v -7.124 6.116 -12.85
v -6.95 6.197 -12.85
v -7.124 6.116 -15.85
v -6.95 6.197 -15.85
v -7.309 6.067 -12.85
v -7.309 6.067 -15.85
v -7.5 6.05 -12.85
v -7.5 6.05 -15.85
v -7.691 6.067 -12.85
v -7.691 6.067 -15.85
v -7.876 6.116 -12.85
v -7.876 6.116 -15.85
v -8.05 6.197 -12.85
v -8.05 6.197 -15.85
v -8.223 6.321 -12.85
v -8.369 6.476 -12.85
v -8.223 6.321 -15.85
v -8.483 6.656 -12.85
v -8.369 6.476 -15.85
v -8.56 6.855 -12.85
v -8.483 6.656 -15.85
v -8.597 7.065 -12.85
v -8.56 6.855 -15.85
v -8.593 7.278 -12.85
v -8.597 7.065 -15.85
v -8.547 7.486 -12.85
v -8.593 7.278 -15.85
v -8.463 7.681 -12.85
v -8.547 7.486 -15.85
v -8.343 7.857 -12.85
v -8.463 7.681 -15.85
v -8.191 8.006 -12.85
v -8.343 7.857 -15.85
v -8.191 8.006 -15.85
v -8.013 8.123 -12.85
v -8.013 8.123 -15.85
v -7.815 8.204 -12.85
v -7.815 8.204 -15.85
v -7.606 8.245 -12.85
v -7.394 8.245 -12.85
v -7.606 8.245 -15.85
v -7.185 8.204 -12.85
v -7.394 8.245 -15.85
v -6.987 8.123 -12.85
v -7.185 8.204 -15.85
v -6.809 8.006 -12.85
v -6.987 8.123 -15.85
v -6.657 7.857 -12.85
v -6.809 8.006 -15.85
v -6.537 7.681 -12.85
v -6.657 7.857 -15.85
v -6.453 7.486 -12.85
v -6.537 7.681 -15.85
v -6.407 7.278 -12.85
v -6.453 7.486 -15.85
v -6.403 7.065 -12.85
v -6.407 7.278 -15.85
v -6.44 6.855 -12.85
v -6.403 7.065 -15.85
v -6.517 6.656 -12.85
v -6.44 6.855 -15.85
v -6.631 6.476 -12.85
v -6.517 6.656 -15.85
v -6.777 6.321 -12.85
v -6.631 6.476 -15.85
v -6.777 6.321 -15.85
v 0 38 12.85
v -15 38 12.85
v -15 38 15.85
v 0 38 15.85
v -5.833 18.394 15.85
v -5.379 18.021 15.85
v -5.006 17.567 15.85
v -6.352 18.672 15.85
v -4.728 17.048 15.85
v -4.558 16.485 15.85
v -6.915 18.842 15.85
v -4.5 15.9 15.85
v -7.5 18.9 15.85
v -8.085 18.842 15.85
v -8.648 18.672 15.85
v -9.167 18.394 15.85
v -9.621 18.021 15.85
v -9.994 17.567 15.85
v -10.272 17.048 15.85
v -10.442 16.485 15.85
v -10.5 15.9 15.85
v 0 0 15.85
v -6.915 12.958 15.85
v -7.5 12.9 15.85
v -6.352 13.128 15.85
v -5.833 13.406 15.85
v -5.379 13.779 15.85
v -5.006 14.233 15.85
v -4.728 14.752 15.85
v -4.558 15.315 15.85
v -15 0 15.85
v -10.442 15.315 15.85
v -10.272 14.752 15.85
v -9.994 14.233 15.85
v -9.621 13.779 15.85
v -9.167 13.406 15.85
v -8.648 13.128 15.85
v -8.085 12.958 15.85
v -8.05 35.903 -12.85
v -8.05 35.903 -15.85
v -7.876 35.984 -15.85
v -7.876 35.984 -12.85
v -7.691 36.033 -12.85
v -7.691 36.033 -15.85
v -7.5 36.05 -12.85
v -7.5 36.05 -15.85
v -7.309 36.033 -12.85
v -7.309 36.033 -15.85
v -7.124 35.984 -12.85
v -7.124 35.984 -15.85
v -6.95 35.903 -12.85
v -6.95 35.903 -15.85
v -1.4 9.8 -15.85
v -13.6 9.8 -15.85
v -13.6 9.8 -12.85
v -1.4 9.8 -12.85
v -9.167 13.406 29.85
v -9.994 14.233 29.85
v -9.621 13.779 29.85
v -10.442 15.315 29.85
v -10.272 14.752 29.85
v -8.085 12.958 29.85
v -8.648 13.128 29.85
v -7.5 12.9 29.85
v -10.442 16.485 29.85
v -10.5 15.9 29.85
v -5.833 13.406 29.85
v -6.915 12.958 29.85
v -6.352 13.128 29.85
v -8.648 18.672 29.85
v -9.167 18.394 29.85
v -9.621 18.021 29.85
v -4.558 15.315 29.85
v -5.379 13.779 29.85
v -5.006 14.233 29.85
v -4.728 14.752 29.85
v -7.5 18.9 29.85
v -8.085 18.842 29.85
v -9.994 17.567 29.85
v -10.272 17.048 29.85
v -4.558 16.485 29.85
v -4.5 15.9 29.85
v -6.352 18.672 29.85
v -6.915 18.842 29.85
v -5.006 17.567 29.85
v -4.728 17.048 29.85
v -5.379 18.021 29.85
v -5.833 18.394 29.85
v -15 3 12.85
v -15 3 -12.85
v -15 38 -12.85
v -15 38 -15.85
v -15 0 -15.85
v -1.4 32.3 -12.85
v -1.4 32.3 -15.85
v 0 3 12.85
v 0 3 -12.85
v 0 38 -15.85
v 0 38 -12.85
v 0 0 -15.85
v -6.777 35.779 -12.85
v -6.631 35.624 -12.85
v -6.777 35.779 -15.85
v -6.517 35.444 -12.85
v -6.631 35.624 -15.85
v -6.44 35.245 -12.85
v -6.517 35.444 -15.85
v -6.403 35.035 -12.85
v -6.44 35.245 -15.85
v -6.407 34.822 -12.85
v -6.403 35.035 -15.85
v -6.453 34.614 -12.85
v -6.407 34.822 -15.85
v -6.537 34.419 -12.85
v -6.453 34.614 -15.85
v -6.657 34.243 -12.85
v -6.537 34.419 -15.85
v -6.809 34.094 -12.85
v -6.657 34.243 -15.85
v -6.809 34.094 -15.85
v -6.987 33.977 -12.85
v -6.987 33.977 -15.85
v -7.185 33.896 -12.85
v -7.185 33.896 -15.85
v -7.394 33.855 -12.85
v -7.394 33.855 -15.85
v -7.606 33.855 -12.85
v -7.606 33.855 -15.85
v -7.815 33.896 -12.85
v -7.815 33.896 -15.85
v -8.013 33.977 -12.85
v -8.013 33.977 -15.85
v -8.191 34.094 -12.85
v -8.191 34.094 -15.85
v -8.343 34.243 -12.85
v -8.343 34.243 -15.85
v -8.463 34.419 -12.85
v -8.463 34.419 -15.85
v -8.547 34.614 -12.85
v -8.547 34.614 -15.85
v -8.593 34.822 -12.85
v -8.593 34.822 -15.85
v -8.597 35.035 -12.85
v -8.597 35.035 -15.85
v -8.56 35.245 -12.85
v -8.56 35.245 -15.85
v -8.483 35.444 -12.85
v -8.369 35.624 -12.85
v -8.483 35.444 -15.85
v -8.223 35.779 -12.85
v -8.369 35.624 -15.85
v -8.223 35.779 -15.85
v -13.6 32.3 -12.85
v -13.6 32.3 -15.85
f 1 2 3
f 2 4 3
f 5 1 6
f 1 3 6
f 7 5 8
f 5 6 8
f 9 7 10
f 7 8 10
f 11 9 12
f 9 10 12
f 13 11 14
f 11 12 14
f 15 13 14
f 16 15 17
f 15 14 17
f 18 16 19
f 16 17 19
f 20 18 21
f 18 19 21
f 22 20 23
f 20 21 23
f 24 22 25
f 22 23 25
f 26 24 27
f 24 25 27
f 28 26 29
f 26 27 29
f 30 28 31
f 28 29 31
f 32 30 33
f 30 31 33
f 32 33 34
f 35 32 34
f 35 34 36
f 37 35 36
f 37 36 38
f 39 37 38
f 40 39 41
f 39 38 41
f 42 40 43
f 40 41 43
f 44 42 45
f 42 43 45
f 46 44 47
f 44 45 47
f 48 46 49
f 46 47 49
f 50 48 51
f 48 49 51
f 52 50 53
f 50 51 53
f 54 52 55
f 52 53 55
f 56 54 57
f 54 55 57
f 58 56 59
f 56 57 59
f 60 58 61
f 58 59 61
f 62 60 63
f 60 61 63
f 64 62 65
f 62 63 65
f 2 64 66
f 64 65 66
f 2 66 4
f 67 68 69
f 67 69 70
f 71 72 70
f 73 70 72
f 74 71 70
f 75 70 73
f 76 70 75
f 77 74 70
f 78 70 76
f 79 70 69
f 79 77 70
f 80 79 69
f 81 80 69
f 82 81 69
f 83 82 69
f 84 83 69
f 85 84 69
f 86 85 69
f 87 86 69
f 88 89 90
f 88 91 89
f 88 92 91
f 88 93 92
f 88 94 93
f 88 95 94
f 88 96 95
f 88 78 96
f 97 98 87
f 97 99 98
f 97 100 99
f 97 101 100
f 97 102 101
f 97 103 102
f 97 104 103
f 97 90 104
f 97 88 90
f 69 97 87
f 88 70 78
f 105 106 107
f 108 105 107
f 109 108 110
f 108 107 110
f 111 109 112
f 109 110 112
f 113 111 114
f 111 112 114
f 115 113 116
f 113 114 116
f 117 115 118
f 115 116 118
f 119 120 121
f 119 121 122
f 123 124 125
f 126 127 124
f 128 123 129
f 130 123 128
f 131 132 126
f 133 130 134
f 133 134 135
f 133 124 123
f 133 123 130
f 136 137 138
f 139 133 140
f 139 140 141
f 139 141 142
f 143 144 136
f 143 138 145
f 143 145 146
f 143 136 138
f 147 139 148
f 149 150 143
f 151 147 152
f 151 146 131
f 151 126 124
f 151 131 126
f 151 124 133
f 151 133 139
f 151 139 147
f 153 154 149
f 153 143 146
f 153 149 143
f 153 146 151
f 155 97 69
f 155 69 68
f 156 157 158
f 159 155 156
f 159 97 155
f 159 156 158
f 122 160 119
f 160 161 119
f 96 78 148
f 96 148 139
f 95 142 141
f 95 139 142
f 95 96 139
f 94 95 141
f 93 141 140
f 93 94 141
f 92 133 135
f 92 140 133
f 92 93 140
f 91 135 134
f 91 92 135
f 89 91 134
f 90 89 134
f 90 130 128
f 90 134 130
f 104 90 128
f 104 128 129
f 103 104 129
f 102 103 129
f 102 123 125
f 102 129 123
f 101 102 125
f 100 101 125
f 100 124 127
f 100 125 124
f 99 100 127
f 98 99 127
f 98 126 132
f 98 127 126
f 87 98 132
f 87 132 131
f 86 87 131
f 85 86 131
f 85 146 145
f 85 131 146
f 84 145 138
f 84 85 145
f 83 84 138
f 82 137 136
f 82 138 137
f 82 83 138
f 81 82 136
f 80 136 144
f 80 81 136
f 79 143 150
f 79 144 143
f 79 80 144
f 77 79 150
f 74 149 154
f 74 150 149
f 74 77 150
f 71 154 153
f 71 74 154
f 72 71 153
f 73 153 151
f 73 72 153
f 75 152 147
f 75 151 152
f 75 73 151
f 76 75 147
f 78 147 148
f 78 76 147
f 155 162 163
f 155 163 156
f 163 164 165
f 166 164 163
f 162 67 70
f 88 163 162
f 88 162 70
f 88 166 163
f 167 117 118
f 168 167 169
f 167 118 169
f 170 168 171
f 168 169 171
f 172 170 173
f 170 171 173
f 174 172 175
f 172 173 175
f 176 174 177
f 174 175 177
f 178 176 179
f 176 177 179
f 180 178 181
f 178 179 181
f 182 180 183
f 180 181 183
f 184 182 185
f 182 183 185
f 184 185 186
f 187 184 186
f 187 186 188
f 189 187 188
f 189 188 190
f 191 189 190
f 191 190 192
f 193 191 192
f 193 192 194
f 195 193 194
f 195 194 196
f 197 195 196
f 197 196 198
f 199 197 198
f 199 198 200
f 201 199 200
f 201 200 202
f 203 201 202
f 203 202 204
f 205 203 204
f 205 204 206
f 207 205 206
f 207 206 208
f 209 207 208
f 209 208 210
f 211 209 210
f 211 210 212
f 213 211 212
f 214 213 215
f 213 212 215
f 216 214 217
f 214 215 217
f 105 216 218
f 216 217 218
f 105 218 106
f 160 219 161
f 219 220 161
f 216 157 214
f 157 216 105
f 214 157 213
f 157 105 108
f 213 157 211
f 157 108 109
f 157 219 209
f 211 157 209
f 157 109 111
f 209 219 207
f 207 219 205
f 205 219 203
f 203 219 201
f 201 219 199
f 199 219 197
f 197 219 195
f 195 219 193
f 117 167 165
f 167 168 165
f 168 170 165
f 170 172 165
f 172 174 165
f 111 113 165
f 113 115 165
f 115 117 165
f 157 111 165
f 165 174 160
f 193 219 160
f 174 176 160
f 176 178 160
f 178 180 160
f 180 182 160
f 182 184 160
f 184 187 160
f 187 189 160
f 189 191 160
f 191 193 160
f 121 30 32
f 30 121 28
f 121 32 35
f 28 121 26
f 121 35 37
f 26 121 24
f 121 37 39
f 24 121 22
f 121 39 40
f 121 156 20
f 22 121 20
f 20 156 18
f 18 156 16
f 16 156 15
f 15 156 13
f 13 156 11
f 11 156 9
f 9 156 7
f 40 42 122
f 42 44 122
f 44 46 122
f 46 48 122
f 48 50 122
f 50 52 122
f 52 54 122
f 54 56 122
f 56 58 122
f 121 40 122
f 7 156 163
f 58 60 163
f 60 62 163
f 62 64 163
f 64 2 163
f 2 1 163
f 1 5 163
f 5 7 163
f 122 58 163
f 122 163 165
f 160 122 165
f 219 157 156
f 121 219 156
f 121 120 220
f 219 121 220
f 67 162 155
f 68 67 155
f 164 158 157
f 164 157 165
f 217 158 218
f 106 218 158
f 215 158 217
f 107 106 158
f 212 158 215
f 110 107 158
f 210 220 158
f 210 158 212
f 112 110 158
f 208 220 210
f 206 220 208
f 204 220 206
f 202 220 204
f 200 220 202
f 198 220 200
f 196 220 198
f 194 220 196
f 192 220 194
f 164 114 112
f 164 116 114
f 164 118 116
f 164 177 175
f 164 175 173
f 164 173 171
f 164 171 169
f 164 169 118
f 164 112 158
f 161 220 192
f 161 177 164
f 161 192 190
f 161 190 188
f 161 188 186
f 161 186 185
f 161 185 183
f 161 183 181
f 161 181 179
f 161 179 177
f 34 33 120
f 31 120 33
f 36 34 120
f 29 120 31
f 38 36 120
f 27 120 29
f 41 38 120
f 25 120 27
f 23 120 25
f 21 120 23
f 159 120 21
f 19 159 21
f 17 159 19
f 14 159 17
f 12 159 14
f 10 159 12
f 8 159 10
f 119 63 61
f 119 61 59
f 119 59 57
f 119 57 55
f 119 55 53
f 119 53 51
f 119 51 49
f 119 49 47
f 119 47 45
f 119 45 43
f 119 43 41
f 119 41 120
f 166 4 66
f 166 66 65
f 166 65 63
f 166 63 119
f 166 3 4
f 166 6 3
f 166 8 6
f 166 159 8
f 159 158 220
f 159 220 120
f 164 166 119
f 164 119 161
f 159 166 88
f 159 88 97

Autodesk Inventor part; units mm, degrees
ref_plane "YZ Plane" through (0, 0, 0) normal (1, 0, 0) x (0, 1, 0)
ref_plane "XZ Plane" through (0, 0, 0) normal (0, 1, 0) x (-1, 0, 0)
ref_plane "XY Plane" through (0, 0, 0) normal (0, 0, 1) x (1, 0, 0)
sketch "Sketch1" plane through (0, 0, 0) normal (0, 1, 0) x (-1, 0, 0)
  line L0 (0, 15.85) -> (15, 15.85)
  line L1 (15, 15.85) -> (15, -15.85)
  line L2 (15, -15.85) -> (0, -15.85)
  line L3 (0, -15.85) -> (0, 15.85)
  point P0 (0, 0)
extrude "Extrusion1" add sketch "Sketch1" along normal blind 3
sketch "Sketch2" plane through (0, 3, 0) normal (0, 1, 0) x (1, 0, 0)
  line L0 (-15, 15.85) -> (-15, -15.85) projected
  line L1 (0, -15.85) -> (0, 15.85) projected
  line L2 (-15, -15.85) -> (0, -15.85)
  line L3 (0, -15.85) -> (0, -12.85)
  line L4 (0, -12.85) -> (-15, -12.85)
  line L5 (-15, -12.85) -> (-15, -15.85)
  line L6 (0, 15.85) -> (-15, 15.85) projected
  line L7 (0, 15.85) -> (-15, 15.85)
  line L8 (-15, 15.85) -> (-15, 12.85)
  line L9 (-15, 12.85) -> (0, 12.85)
  line L10 (0, 12.85) -> (0, 15.85)
  point P0 (0, 0)
  dimension "d5" = 3
  dimension "d6" = 3
extrude "Extrusion2" add sketch "Sketch2" along normal blind 35 contours L6 L1 L9 L0 | L4 L1 L2 L0
sketch "Sketch4" plane through (0, 0, -15.85) normal (0, 0, -1) x (-1, 0, 0)
  arc A0 (8.05, 6.1974) -> (6.95, 6.1974) centre (7.5, 7.15) ccw
  line L0 (8.05, 5) -> (12.75, 5)
  line L1 (2.25, 5) -> (6.95, 5)
  line L2 (1.4, 10.65) -> (1.4, 5.85)
  line L3 (6.95, 37.1) -> (2.25, 37.1)
  line L4 (12.75, 37.1) -> (8.05, 37.1)
  arc A1 (6.95, 35.9026) -> (8.05, 35.9026) centre (7.5, 34.95) ccw
  line L5 (6.95, 37.1) -> (6.95, 35.9026)
  line L6 (8.05, 35.9026) -> (8.05, 37.1)
  line L7 (13.6, 31.45) -> (13.6, 36.25)
  line L8 (13.6, 5.85) -> (13.6, 10.65)
  arc A2 (12.75, 5) -> (13.6, 5.85) centre (12.75, 5.85) ccw
  line L9 (8.05, 5) -> (8.05, 6.1974)
  line L10 (6.95, 6.1974) -> (6.95, 5)
  arc A3 (1.4, 5.85) -> (2.25, 5) centre (2.25, 5.85) ccw
  arc A4 (2.25, 37.1) -> (1.4, 36.25) centre (2.25, 36.25) ccw
  line L11 (1.4, 36.25) -> (1.4, 31.45)
  line L12 (1.4, 27.762) -> (1.4, 31.45)
  line L13 (1.4, 10.65) -> (1.4, 24.638)
  circle A5 centre (7.5, 26.2) radius 2.25
  line L14 (13.6, 31.45) -> (13.6, 27.762)
  line L15 (13.6, 24.638) -> (13.6, 10.65)
  line L16 (2.25, 9.8) -> (12.75, 9.8)
  line L17 (12.75, 32.3) -> (2.25, 32.3)
  arc A6 (2.25, 32.3) -> (1.4, 31.45) centre (2.25, 31.45) ccw
  arc A7 (13.6, 31.45) -> (12.75, 32.3) centre (12.75, 31.45) ccw
  arc A8 (13.6, 36.25) -> (12.75, 37.1) centre (12.75, 36.25) ccw
  arc A9 (1.4, 10.65) -> (2.25, 9.8) centre (2.25, 10.65) ccw
  arc A10 (12.75, 9.8) -> (13.6, 10.65) centre (12.75, 10.65) ccw
  line L18 (13.6, 24.638) -> (13.6, 27.762)
  line L19 (1.4, 27.762) -> (1.4, 24.638)
  line L20 (0, 3) -> (15, 3) projected
  line L21 (15, 3) -> (0, 3)
  line L22 (0, 3) -> (0, 5)
  line L23 (0, 0) -> (0, 38) projected
  line L24 (0, 5) -> (15, 5)
  line L25 (15, 5) -> (15, 3)
  line L26 (15, 0) -> (15, 38) projected
  line L27 (7.5, 5) -> (7.5, 3)
  line L28 (8.05, 5) -> (6.95, 5)
  line L29 (7.5, 5) -> (7.5, 4.3316)
  line L30 (12.75, 37.1) -> (13.6, 37.1)
  line L31 (13.6, 37.1) -> (13.6, 36.25)
  line L32 (13.6, 5.85) -> (13.6, 5)
  line L33 (1.4, 5.85) -> (1.4, 5)
  line L34 (1.4, 36.25) -> (1.4, 37.1)
  line L35 (1.4, 37.1) -> (2.25, 37.1)
  line L36 (2.25, 32.3) -> (1.4, 32.3)
  line L37 (12.75, 32.3) -> (13.6, 32.3)
  line L38 (13.6, 10.65) -> (13.6, 9.8)
  line L39 (13.6, 9.8) -> (12.75, 9.8)
  line L40 (1.4, 9.8) -> (2.25, 9.8)
  circle A11 centre (7.5, 34.95) radius 1.1
  circle A12 centre (7.5, 7.15) radius 1.1
  point P0 (6.95, 6.1974)
  point P1 (8.05, 6.1974)
  point P2 (8.05, 35.9026)
  point P3 (6.95, 35.9026)
  dimension "d9" = 2
extrude "Extrusion3" cut sketch "Sketch4" against normal up to surface (3 mm away) contours A12 A0 | L39 A10 L8 | A10 L16 A9 L13 L19 L12 A6 L17 A7 L14 L18 L15 | L2 A9 L40 | A7 L37 L7 | L11 L36 A6 | A1 A11 | A5
sketch "Sketch6" plane through (-15, 0, 15.85) normal (0, 0, 1) x (1, 0, 0)
  circle A0 centre (7.5, 15.9) radius 3
  line L0 (0, 0) -> (0, 38)
  line L1 (0, 0) -> (15, 0)
  line L2 (15, 0) -> (15, 38)
extrude "Extrusion5" add sketch "Sketch6" along normal blind 14
properties part number "head_p2"
